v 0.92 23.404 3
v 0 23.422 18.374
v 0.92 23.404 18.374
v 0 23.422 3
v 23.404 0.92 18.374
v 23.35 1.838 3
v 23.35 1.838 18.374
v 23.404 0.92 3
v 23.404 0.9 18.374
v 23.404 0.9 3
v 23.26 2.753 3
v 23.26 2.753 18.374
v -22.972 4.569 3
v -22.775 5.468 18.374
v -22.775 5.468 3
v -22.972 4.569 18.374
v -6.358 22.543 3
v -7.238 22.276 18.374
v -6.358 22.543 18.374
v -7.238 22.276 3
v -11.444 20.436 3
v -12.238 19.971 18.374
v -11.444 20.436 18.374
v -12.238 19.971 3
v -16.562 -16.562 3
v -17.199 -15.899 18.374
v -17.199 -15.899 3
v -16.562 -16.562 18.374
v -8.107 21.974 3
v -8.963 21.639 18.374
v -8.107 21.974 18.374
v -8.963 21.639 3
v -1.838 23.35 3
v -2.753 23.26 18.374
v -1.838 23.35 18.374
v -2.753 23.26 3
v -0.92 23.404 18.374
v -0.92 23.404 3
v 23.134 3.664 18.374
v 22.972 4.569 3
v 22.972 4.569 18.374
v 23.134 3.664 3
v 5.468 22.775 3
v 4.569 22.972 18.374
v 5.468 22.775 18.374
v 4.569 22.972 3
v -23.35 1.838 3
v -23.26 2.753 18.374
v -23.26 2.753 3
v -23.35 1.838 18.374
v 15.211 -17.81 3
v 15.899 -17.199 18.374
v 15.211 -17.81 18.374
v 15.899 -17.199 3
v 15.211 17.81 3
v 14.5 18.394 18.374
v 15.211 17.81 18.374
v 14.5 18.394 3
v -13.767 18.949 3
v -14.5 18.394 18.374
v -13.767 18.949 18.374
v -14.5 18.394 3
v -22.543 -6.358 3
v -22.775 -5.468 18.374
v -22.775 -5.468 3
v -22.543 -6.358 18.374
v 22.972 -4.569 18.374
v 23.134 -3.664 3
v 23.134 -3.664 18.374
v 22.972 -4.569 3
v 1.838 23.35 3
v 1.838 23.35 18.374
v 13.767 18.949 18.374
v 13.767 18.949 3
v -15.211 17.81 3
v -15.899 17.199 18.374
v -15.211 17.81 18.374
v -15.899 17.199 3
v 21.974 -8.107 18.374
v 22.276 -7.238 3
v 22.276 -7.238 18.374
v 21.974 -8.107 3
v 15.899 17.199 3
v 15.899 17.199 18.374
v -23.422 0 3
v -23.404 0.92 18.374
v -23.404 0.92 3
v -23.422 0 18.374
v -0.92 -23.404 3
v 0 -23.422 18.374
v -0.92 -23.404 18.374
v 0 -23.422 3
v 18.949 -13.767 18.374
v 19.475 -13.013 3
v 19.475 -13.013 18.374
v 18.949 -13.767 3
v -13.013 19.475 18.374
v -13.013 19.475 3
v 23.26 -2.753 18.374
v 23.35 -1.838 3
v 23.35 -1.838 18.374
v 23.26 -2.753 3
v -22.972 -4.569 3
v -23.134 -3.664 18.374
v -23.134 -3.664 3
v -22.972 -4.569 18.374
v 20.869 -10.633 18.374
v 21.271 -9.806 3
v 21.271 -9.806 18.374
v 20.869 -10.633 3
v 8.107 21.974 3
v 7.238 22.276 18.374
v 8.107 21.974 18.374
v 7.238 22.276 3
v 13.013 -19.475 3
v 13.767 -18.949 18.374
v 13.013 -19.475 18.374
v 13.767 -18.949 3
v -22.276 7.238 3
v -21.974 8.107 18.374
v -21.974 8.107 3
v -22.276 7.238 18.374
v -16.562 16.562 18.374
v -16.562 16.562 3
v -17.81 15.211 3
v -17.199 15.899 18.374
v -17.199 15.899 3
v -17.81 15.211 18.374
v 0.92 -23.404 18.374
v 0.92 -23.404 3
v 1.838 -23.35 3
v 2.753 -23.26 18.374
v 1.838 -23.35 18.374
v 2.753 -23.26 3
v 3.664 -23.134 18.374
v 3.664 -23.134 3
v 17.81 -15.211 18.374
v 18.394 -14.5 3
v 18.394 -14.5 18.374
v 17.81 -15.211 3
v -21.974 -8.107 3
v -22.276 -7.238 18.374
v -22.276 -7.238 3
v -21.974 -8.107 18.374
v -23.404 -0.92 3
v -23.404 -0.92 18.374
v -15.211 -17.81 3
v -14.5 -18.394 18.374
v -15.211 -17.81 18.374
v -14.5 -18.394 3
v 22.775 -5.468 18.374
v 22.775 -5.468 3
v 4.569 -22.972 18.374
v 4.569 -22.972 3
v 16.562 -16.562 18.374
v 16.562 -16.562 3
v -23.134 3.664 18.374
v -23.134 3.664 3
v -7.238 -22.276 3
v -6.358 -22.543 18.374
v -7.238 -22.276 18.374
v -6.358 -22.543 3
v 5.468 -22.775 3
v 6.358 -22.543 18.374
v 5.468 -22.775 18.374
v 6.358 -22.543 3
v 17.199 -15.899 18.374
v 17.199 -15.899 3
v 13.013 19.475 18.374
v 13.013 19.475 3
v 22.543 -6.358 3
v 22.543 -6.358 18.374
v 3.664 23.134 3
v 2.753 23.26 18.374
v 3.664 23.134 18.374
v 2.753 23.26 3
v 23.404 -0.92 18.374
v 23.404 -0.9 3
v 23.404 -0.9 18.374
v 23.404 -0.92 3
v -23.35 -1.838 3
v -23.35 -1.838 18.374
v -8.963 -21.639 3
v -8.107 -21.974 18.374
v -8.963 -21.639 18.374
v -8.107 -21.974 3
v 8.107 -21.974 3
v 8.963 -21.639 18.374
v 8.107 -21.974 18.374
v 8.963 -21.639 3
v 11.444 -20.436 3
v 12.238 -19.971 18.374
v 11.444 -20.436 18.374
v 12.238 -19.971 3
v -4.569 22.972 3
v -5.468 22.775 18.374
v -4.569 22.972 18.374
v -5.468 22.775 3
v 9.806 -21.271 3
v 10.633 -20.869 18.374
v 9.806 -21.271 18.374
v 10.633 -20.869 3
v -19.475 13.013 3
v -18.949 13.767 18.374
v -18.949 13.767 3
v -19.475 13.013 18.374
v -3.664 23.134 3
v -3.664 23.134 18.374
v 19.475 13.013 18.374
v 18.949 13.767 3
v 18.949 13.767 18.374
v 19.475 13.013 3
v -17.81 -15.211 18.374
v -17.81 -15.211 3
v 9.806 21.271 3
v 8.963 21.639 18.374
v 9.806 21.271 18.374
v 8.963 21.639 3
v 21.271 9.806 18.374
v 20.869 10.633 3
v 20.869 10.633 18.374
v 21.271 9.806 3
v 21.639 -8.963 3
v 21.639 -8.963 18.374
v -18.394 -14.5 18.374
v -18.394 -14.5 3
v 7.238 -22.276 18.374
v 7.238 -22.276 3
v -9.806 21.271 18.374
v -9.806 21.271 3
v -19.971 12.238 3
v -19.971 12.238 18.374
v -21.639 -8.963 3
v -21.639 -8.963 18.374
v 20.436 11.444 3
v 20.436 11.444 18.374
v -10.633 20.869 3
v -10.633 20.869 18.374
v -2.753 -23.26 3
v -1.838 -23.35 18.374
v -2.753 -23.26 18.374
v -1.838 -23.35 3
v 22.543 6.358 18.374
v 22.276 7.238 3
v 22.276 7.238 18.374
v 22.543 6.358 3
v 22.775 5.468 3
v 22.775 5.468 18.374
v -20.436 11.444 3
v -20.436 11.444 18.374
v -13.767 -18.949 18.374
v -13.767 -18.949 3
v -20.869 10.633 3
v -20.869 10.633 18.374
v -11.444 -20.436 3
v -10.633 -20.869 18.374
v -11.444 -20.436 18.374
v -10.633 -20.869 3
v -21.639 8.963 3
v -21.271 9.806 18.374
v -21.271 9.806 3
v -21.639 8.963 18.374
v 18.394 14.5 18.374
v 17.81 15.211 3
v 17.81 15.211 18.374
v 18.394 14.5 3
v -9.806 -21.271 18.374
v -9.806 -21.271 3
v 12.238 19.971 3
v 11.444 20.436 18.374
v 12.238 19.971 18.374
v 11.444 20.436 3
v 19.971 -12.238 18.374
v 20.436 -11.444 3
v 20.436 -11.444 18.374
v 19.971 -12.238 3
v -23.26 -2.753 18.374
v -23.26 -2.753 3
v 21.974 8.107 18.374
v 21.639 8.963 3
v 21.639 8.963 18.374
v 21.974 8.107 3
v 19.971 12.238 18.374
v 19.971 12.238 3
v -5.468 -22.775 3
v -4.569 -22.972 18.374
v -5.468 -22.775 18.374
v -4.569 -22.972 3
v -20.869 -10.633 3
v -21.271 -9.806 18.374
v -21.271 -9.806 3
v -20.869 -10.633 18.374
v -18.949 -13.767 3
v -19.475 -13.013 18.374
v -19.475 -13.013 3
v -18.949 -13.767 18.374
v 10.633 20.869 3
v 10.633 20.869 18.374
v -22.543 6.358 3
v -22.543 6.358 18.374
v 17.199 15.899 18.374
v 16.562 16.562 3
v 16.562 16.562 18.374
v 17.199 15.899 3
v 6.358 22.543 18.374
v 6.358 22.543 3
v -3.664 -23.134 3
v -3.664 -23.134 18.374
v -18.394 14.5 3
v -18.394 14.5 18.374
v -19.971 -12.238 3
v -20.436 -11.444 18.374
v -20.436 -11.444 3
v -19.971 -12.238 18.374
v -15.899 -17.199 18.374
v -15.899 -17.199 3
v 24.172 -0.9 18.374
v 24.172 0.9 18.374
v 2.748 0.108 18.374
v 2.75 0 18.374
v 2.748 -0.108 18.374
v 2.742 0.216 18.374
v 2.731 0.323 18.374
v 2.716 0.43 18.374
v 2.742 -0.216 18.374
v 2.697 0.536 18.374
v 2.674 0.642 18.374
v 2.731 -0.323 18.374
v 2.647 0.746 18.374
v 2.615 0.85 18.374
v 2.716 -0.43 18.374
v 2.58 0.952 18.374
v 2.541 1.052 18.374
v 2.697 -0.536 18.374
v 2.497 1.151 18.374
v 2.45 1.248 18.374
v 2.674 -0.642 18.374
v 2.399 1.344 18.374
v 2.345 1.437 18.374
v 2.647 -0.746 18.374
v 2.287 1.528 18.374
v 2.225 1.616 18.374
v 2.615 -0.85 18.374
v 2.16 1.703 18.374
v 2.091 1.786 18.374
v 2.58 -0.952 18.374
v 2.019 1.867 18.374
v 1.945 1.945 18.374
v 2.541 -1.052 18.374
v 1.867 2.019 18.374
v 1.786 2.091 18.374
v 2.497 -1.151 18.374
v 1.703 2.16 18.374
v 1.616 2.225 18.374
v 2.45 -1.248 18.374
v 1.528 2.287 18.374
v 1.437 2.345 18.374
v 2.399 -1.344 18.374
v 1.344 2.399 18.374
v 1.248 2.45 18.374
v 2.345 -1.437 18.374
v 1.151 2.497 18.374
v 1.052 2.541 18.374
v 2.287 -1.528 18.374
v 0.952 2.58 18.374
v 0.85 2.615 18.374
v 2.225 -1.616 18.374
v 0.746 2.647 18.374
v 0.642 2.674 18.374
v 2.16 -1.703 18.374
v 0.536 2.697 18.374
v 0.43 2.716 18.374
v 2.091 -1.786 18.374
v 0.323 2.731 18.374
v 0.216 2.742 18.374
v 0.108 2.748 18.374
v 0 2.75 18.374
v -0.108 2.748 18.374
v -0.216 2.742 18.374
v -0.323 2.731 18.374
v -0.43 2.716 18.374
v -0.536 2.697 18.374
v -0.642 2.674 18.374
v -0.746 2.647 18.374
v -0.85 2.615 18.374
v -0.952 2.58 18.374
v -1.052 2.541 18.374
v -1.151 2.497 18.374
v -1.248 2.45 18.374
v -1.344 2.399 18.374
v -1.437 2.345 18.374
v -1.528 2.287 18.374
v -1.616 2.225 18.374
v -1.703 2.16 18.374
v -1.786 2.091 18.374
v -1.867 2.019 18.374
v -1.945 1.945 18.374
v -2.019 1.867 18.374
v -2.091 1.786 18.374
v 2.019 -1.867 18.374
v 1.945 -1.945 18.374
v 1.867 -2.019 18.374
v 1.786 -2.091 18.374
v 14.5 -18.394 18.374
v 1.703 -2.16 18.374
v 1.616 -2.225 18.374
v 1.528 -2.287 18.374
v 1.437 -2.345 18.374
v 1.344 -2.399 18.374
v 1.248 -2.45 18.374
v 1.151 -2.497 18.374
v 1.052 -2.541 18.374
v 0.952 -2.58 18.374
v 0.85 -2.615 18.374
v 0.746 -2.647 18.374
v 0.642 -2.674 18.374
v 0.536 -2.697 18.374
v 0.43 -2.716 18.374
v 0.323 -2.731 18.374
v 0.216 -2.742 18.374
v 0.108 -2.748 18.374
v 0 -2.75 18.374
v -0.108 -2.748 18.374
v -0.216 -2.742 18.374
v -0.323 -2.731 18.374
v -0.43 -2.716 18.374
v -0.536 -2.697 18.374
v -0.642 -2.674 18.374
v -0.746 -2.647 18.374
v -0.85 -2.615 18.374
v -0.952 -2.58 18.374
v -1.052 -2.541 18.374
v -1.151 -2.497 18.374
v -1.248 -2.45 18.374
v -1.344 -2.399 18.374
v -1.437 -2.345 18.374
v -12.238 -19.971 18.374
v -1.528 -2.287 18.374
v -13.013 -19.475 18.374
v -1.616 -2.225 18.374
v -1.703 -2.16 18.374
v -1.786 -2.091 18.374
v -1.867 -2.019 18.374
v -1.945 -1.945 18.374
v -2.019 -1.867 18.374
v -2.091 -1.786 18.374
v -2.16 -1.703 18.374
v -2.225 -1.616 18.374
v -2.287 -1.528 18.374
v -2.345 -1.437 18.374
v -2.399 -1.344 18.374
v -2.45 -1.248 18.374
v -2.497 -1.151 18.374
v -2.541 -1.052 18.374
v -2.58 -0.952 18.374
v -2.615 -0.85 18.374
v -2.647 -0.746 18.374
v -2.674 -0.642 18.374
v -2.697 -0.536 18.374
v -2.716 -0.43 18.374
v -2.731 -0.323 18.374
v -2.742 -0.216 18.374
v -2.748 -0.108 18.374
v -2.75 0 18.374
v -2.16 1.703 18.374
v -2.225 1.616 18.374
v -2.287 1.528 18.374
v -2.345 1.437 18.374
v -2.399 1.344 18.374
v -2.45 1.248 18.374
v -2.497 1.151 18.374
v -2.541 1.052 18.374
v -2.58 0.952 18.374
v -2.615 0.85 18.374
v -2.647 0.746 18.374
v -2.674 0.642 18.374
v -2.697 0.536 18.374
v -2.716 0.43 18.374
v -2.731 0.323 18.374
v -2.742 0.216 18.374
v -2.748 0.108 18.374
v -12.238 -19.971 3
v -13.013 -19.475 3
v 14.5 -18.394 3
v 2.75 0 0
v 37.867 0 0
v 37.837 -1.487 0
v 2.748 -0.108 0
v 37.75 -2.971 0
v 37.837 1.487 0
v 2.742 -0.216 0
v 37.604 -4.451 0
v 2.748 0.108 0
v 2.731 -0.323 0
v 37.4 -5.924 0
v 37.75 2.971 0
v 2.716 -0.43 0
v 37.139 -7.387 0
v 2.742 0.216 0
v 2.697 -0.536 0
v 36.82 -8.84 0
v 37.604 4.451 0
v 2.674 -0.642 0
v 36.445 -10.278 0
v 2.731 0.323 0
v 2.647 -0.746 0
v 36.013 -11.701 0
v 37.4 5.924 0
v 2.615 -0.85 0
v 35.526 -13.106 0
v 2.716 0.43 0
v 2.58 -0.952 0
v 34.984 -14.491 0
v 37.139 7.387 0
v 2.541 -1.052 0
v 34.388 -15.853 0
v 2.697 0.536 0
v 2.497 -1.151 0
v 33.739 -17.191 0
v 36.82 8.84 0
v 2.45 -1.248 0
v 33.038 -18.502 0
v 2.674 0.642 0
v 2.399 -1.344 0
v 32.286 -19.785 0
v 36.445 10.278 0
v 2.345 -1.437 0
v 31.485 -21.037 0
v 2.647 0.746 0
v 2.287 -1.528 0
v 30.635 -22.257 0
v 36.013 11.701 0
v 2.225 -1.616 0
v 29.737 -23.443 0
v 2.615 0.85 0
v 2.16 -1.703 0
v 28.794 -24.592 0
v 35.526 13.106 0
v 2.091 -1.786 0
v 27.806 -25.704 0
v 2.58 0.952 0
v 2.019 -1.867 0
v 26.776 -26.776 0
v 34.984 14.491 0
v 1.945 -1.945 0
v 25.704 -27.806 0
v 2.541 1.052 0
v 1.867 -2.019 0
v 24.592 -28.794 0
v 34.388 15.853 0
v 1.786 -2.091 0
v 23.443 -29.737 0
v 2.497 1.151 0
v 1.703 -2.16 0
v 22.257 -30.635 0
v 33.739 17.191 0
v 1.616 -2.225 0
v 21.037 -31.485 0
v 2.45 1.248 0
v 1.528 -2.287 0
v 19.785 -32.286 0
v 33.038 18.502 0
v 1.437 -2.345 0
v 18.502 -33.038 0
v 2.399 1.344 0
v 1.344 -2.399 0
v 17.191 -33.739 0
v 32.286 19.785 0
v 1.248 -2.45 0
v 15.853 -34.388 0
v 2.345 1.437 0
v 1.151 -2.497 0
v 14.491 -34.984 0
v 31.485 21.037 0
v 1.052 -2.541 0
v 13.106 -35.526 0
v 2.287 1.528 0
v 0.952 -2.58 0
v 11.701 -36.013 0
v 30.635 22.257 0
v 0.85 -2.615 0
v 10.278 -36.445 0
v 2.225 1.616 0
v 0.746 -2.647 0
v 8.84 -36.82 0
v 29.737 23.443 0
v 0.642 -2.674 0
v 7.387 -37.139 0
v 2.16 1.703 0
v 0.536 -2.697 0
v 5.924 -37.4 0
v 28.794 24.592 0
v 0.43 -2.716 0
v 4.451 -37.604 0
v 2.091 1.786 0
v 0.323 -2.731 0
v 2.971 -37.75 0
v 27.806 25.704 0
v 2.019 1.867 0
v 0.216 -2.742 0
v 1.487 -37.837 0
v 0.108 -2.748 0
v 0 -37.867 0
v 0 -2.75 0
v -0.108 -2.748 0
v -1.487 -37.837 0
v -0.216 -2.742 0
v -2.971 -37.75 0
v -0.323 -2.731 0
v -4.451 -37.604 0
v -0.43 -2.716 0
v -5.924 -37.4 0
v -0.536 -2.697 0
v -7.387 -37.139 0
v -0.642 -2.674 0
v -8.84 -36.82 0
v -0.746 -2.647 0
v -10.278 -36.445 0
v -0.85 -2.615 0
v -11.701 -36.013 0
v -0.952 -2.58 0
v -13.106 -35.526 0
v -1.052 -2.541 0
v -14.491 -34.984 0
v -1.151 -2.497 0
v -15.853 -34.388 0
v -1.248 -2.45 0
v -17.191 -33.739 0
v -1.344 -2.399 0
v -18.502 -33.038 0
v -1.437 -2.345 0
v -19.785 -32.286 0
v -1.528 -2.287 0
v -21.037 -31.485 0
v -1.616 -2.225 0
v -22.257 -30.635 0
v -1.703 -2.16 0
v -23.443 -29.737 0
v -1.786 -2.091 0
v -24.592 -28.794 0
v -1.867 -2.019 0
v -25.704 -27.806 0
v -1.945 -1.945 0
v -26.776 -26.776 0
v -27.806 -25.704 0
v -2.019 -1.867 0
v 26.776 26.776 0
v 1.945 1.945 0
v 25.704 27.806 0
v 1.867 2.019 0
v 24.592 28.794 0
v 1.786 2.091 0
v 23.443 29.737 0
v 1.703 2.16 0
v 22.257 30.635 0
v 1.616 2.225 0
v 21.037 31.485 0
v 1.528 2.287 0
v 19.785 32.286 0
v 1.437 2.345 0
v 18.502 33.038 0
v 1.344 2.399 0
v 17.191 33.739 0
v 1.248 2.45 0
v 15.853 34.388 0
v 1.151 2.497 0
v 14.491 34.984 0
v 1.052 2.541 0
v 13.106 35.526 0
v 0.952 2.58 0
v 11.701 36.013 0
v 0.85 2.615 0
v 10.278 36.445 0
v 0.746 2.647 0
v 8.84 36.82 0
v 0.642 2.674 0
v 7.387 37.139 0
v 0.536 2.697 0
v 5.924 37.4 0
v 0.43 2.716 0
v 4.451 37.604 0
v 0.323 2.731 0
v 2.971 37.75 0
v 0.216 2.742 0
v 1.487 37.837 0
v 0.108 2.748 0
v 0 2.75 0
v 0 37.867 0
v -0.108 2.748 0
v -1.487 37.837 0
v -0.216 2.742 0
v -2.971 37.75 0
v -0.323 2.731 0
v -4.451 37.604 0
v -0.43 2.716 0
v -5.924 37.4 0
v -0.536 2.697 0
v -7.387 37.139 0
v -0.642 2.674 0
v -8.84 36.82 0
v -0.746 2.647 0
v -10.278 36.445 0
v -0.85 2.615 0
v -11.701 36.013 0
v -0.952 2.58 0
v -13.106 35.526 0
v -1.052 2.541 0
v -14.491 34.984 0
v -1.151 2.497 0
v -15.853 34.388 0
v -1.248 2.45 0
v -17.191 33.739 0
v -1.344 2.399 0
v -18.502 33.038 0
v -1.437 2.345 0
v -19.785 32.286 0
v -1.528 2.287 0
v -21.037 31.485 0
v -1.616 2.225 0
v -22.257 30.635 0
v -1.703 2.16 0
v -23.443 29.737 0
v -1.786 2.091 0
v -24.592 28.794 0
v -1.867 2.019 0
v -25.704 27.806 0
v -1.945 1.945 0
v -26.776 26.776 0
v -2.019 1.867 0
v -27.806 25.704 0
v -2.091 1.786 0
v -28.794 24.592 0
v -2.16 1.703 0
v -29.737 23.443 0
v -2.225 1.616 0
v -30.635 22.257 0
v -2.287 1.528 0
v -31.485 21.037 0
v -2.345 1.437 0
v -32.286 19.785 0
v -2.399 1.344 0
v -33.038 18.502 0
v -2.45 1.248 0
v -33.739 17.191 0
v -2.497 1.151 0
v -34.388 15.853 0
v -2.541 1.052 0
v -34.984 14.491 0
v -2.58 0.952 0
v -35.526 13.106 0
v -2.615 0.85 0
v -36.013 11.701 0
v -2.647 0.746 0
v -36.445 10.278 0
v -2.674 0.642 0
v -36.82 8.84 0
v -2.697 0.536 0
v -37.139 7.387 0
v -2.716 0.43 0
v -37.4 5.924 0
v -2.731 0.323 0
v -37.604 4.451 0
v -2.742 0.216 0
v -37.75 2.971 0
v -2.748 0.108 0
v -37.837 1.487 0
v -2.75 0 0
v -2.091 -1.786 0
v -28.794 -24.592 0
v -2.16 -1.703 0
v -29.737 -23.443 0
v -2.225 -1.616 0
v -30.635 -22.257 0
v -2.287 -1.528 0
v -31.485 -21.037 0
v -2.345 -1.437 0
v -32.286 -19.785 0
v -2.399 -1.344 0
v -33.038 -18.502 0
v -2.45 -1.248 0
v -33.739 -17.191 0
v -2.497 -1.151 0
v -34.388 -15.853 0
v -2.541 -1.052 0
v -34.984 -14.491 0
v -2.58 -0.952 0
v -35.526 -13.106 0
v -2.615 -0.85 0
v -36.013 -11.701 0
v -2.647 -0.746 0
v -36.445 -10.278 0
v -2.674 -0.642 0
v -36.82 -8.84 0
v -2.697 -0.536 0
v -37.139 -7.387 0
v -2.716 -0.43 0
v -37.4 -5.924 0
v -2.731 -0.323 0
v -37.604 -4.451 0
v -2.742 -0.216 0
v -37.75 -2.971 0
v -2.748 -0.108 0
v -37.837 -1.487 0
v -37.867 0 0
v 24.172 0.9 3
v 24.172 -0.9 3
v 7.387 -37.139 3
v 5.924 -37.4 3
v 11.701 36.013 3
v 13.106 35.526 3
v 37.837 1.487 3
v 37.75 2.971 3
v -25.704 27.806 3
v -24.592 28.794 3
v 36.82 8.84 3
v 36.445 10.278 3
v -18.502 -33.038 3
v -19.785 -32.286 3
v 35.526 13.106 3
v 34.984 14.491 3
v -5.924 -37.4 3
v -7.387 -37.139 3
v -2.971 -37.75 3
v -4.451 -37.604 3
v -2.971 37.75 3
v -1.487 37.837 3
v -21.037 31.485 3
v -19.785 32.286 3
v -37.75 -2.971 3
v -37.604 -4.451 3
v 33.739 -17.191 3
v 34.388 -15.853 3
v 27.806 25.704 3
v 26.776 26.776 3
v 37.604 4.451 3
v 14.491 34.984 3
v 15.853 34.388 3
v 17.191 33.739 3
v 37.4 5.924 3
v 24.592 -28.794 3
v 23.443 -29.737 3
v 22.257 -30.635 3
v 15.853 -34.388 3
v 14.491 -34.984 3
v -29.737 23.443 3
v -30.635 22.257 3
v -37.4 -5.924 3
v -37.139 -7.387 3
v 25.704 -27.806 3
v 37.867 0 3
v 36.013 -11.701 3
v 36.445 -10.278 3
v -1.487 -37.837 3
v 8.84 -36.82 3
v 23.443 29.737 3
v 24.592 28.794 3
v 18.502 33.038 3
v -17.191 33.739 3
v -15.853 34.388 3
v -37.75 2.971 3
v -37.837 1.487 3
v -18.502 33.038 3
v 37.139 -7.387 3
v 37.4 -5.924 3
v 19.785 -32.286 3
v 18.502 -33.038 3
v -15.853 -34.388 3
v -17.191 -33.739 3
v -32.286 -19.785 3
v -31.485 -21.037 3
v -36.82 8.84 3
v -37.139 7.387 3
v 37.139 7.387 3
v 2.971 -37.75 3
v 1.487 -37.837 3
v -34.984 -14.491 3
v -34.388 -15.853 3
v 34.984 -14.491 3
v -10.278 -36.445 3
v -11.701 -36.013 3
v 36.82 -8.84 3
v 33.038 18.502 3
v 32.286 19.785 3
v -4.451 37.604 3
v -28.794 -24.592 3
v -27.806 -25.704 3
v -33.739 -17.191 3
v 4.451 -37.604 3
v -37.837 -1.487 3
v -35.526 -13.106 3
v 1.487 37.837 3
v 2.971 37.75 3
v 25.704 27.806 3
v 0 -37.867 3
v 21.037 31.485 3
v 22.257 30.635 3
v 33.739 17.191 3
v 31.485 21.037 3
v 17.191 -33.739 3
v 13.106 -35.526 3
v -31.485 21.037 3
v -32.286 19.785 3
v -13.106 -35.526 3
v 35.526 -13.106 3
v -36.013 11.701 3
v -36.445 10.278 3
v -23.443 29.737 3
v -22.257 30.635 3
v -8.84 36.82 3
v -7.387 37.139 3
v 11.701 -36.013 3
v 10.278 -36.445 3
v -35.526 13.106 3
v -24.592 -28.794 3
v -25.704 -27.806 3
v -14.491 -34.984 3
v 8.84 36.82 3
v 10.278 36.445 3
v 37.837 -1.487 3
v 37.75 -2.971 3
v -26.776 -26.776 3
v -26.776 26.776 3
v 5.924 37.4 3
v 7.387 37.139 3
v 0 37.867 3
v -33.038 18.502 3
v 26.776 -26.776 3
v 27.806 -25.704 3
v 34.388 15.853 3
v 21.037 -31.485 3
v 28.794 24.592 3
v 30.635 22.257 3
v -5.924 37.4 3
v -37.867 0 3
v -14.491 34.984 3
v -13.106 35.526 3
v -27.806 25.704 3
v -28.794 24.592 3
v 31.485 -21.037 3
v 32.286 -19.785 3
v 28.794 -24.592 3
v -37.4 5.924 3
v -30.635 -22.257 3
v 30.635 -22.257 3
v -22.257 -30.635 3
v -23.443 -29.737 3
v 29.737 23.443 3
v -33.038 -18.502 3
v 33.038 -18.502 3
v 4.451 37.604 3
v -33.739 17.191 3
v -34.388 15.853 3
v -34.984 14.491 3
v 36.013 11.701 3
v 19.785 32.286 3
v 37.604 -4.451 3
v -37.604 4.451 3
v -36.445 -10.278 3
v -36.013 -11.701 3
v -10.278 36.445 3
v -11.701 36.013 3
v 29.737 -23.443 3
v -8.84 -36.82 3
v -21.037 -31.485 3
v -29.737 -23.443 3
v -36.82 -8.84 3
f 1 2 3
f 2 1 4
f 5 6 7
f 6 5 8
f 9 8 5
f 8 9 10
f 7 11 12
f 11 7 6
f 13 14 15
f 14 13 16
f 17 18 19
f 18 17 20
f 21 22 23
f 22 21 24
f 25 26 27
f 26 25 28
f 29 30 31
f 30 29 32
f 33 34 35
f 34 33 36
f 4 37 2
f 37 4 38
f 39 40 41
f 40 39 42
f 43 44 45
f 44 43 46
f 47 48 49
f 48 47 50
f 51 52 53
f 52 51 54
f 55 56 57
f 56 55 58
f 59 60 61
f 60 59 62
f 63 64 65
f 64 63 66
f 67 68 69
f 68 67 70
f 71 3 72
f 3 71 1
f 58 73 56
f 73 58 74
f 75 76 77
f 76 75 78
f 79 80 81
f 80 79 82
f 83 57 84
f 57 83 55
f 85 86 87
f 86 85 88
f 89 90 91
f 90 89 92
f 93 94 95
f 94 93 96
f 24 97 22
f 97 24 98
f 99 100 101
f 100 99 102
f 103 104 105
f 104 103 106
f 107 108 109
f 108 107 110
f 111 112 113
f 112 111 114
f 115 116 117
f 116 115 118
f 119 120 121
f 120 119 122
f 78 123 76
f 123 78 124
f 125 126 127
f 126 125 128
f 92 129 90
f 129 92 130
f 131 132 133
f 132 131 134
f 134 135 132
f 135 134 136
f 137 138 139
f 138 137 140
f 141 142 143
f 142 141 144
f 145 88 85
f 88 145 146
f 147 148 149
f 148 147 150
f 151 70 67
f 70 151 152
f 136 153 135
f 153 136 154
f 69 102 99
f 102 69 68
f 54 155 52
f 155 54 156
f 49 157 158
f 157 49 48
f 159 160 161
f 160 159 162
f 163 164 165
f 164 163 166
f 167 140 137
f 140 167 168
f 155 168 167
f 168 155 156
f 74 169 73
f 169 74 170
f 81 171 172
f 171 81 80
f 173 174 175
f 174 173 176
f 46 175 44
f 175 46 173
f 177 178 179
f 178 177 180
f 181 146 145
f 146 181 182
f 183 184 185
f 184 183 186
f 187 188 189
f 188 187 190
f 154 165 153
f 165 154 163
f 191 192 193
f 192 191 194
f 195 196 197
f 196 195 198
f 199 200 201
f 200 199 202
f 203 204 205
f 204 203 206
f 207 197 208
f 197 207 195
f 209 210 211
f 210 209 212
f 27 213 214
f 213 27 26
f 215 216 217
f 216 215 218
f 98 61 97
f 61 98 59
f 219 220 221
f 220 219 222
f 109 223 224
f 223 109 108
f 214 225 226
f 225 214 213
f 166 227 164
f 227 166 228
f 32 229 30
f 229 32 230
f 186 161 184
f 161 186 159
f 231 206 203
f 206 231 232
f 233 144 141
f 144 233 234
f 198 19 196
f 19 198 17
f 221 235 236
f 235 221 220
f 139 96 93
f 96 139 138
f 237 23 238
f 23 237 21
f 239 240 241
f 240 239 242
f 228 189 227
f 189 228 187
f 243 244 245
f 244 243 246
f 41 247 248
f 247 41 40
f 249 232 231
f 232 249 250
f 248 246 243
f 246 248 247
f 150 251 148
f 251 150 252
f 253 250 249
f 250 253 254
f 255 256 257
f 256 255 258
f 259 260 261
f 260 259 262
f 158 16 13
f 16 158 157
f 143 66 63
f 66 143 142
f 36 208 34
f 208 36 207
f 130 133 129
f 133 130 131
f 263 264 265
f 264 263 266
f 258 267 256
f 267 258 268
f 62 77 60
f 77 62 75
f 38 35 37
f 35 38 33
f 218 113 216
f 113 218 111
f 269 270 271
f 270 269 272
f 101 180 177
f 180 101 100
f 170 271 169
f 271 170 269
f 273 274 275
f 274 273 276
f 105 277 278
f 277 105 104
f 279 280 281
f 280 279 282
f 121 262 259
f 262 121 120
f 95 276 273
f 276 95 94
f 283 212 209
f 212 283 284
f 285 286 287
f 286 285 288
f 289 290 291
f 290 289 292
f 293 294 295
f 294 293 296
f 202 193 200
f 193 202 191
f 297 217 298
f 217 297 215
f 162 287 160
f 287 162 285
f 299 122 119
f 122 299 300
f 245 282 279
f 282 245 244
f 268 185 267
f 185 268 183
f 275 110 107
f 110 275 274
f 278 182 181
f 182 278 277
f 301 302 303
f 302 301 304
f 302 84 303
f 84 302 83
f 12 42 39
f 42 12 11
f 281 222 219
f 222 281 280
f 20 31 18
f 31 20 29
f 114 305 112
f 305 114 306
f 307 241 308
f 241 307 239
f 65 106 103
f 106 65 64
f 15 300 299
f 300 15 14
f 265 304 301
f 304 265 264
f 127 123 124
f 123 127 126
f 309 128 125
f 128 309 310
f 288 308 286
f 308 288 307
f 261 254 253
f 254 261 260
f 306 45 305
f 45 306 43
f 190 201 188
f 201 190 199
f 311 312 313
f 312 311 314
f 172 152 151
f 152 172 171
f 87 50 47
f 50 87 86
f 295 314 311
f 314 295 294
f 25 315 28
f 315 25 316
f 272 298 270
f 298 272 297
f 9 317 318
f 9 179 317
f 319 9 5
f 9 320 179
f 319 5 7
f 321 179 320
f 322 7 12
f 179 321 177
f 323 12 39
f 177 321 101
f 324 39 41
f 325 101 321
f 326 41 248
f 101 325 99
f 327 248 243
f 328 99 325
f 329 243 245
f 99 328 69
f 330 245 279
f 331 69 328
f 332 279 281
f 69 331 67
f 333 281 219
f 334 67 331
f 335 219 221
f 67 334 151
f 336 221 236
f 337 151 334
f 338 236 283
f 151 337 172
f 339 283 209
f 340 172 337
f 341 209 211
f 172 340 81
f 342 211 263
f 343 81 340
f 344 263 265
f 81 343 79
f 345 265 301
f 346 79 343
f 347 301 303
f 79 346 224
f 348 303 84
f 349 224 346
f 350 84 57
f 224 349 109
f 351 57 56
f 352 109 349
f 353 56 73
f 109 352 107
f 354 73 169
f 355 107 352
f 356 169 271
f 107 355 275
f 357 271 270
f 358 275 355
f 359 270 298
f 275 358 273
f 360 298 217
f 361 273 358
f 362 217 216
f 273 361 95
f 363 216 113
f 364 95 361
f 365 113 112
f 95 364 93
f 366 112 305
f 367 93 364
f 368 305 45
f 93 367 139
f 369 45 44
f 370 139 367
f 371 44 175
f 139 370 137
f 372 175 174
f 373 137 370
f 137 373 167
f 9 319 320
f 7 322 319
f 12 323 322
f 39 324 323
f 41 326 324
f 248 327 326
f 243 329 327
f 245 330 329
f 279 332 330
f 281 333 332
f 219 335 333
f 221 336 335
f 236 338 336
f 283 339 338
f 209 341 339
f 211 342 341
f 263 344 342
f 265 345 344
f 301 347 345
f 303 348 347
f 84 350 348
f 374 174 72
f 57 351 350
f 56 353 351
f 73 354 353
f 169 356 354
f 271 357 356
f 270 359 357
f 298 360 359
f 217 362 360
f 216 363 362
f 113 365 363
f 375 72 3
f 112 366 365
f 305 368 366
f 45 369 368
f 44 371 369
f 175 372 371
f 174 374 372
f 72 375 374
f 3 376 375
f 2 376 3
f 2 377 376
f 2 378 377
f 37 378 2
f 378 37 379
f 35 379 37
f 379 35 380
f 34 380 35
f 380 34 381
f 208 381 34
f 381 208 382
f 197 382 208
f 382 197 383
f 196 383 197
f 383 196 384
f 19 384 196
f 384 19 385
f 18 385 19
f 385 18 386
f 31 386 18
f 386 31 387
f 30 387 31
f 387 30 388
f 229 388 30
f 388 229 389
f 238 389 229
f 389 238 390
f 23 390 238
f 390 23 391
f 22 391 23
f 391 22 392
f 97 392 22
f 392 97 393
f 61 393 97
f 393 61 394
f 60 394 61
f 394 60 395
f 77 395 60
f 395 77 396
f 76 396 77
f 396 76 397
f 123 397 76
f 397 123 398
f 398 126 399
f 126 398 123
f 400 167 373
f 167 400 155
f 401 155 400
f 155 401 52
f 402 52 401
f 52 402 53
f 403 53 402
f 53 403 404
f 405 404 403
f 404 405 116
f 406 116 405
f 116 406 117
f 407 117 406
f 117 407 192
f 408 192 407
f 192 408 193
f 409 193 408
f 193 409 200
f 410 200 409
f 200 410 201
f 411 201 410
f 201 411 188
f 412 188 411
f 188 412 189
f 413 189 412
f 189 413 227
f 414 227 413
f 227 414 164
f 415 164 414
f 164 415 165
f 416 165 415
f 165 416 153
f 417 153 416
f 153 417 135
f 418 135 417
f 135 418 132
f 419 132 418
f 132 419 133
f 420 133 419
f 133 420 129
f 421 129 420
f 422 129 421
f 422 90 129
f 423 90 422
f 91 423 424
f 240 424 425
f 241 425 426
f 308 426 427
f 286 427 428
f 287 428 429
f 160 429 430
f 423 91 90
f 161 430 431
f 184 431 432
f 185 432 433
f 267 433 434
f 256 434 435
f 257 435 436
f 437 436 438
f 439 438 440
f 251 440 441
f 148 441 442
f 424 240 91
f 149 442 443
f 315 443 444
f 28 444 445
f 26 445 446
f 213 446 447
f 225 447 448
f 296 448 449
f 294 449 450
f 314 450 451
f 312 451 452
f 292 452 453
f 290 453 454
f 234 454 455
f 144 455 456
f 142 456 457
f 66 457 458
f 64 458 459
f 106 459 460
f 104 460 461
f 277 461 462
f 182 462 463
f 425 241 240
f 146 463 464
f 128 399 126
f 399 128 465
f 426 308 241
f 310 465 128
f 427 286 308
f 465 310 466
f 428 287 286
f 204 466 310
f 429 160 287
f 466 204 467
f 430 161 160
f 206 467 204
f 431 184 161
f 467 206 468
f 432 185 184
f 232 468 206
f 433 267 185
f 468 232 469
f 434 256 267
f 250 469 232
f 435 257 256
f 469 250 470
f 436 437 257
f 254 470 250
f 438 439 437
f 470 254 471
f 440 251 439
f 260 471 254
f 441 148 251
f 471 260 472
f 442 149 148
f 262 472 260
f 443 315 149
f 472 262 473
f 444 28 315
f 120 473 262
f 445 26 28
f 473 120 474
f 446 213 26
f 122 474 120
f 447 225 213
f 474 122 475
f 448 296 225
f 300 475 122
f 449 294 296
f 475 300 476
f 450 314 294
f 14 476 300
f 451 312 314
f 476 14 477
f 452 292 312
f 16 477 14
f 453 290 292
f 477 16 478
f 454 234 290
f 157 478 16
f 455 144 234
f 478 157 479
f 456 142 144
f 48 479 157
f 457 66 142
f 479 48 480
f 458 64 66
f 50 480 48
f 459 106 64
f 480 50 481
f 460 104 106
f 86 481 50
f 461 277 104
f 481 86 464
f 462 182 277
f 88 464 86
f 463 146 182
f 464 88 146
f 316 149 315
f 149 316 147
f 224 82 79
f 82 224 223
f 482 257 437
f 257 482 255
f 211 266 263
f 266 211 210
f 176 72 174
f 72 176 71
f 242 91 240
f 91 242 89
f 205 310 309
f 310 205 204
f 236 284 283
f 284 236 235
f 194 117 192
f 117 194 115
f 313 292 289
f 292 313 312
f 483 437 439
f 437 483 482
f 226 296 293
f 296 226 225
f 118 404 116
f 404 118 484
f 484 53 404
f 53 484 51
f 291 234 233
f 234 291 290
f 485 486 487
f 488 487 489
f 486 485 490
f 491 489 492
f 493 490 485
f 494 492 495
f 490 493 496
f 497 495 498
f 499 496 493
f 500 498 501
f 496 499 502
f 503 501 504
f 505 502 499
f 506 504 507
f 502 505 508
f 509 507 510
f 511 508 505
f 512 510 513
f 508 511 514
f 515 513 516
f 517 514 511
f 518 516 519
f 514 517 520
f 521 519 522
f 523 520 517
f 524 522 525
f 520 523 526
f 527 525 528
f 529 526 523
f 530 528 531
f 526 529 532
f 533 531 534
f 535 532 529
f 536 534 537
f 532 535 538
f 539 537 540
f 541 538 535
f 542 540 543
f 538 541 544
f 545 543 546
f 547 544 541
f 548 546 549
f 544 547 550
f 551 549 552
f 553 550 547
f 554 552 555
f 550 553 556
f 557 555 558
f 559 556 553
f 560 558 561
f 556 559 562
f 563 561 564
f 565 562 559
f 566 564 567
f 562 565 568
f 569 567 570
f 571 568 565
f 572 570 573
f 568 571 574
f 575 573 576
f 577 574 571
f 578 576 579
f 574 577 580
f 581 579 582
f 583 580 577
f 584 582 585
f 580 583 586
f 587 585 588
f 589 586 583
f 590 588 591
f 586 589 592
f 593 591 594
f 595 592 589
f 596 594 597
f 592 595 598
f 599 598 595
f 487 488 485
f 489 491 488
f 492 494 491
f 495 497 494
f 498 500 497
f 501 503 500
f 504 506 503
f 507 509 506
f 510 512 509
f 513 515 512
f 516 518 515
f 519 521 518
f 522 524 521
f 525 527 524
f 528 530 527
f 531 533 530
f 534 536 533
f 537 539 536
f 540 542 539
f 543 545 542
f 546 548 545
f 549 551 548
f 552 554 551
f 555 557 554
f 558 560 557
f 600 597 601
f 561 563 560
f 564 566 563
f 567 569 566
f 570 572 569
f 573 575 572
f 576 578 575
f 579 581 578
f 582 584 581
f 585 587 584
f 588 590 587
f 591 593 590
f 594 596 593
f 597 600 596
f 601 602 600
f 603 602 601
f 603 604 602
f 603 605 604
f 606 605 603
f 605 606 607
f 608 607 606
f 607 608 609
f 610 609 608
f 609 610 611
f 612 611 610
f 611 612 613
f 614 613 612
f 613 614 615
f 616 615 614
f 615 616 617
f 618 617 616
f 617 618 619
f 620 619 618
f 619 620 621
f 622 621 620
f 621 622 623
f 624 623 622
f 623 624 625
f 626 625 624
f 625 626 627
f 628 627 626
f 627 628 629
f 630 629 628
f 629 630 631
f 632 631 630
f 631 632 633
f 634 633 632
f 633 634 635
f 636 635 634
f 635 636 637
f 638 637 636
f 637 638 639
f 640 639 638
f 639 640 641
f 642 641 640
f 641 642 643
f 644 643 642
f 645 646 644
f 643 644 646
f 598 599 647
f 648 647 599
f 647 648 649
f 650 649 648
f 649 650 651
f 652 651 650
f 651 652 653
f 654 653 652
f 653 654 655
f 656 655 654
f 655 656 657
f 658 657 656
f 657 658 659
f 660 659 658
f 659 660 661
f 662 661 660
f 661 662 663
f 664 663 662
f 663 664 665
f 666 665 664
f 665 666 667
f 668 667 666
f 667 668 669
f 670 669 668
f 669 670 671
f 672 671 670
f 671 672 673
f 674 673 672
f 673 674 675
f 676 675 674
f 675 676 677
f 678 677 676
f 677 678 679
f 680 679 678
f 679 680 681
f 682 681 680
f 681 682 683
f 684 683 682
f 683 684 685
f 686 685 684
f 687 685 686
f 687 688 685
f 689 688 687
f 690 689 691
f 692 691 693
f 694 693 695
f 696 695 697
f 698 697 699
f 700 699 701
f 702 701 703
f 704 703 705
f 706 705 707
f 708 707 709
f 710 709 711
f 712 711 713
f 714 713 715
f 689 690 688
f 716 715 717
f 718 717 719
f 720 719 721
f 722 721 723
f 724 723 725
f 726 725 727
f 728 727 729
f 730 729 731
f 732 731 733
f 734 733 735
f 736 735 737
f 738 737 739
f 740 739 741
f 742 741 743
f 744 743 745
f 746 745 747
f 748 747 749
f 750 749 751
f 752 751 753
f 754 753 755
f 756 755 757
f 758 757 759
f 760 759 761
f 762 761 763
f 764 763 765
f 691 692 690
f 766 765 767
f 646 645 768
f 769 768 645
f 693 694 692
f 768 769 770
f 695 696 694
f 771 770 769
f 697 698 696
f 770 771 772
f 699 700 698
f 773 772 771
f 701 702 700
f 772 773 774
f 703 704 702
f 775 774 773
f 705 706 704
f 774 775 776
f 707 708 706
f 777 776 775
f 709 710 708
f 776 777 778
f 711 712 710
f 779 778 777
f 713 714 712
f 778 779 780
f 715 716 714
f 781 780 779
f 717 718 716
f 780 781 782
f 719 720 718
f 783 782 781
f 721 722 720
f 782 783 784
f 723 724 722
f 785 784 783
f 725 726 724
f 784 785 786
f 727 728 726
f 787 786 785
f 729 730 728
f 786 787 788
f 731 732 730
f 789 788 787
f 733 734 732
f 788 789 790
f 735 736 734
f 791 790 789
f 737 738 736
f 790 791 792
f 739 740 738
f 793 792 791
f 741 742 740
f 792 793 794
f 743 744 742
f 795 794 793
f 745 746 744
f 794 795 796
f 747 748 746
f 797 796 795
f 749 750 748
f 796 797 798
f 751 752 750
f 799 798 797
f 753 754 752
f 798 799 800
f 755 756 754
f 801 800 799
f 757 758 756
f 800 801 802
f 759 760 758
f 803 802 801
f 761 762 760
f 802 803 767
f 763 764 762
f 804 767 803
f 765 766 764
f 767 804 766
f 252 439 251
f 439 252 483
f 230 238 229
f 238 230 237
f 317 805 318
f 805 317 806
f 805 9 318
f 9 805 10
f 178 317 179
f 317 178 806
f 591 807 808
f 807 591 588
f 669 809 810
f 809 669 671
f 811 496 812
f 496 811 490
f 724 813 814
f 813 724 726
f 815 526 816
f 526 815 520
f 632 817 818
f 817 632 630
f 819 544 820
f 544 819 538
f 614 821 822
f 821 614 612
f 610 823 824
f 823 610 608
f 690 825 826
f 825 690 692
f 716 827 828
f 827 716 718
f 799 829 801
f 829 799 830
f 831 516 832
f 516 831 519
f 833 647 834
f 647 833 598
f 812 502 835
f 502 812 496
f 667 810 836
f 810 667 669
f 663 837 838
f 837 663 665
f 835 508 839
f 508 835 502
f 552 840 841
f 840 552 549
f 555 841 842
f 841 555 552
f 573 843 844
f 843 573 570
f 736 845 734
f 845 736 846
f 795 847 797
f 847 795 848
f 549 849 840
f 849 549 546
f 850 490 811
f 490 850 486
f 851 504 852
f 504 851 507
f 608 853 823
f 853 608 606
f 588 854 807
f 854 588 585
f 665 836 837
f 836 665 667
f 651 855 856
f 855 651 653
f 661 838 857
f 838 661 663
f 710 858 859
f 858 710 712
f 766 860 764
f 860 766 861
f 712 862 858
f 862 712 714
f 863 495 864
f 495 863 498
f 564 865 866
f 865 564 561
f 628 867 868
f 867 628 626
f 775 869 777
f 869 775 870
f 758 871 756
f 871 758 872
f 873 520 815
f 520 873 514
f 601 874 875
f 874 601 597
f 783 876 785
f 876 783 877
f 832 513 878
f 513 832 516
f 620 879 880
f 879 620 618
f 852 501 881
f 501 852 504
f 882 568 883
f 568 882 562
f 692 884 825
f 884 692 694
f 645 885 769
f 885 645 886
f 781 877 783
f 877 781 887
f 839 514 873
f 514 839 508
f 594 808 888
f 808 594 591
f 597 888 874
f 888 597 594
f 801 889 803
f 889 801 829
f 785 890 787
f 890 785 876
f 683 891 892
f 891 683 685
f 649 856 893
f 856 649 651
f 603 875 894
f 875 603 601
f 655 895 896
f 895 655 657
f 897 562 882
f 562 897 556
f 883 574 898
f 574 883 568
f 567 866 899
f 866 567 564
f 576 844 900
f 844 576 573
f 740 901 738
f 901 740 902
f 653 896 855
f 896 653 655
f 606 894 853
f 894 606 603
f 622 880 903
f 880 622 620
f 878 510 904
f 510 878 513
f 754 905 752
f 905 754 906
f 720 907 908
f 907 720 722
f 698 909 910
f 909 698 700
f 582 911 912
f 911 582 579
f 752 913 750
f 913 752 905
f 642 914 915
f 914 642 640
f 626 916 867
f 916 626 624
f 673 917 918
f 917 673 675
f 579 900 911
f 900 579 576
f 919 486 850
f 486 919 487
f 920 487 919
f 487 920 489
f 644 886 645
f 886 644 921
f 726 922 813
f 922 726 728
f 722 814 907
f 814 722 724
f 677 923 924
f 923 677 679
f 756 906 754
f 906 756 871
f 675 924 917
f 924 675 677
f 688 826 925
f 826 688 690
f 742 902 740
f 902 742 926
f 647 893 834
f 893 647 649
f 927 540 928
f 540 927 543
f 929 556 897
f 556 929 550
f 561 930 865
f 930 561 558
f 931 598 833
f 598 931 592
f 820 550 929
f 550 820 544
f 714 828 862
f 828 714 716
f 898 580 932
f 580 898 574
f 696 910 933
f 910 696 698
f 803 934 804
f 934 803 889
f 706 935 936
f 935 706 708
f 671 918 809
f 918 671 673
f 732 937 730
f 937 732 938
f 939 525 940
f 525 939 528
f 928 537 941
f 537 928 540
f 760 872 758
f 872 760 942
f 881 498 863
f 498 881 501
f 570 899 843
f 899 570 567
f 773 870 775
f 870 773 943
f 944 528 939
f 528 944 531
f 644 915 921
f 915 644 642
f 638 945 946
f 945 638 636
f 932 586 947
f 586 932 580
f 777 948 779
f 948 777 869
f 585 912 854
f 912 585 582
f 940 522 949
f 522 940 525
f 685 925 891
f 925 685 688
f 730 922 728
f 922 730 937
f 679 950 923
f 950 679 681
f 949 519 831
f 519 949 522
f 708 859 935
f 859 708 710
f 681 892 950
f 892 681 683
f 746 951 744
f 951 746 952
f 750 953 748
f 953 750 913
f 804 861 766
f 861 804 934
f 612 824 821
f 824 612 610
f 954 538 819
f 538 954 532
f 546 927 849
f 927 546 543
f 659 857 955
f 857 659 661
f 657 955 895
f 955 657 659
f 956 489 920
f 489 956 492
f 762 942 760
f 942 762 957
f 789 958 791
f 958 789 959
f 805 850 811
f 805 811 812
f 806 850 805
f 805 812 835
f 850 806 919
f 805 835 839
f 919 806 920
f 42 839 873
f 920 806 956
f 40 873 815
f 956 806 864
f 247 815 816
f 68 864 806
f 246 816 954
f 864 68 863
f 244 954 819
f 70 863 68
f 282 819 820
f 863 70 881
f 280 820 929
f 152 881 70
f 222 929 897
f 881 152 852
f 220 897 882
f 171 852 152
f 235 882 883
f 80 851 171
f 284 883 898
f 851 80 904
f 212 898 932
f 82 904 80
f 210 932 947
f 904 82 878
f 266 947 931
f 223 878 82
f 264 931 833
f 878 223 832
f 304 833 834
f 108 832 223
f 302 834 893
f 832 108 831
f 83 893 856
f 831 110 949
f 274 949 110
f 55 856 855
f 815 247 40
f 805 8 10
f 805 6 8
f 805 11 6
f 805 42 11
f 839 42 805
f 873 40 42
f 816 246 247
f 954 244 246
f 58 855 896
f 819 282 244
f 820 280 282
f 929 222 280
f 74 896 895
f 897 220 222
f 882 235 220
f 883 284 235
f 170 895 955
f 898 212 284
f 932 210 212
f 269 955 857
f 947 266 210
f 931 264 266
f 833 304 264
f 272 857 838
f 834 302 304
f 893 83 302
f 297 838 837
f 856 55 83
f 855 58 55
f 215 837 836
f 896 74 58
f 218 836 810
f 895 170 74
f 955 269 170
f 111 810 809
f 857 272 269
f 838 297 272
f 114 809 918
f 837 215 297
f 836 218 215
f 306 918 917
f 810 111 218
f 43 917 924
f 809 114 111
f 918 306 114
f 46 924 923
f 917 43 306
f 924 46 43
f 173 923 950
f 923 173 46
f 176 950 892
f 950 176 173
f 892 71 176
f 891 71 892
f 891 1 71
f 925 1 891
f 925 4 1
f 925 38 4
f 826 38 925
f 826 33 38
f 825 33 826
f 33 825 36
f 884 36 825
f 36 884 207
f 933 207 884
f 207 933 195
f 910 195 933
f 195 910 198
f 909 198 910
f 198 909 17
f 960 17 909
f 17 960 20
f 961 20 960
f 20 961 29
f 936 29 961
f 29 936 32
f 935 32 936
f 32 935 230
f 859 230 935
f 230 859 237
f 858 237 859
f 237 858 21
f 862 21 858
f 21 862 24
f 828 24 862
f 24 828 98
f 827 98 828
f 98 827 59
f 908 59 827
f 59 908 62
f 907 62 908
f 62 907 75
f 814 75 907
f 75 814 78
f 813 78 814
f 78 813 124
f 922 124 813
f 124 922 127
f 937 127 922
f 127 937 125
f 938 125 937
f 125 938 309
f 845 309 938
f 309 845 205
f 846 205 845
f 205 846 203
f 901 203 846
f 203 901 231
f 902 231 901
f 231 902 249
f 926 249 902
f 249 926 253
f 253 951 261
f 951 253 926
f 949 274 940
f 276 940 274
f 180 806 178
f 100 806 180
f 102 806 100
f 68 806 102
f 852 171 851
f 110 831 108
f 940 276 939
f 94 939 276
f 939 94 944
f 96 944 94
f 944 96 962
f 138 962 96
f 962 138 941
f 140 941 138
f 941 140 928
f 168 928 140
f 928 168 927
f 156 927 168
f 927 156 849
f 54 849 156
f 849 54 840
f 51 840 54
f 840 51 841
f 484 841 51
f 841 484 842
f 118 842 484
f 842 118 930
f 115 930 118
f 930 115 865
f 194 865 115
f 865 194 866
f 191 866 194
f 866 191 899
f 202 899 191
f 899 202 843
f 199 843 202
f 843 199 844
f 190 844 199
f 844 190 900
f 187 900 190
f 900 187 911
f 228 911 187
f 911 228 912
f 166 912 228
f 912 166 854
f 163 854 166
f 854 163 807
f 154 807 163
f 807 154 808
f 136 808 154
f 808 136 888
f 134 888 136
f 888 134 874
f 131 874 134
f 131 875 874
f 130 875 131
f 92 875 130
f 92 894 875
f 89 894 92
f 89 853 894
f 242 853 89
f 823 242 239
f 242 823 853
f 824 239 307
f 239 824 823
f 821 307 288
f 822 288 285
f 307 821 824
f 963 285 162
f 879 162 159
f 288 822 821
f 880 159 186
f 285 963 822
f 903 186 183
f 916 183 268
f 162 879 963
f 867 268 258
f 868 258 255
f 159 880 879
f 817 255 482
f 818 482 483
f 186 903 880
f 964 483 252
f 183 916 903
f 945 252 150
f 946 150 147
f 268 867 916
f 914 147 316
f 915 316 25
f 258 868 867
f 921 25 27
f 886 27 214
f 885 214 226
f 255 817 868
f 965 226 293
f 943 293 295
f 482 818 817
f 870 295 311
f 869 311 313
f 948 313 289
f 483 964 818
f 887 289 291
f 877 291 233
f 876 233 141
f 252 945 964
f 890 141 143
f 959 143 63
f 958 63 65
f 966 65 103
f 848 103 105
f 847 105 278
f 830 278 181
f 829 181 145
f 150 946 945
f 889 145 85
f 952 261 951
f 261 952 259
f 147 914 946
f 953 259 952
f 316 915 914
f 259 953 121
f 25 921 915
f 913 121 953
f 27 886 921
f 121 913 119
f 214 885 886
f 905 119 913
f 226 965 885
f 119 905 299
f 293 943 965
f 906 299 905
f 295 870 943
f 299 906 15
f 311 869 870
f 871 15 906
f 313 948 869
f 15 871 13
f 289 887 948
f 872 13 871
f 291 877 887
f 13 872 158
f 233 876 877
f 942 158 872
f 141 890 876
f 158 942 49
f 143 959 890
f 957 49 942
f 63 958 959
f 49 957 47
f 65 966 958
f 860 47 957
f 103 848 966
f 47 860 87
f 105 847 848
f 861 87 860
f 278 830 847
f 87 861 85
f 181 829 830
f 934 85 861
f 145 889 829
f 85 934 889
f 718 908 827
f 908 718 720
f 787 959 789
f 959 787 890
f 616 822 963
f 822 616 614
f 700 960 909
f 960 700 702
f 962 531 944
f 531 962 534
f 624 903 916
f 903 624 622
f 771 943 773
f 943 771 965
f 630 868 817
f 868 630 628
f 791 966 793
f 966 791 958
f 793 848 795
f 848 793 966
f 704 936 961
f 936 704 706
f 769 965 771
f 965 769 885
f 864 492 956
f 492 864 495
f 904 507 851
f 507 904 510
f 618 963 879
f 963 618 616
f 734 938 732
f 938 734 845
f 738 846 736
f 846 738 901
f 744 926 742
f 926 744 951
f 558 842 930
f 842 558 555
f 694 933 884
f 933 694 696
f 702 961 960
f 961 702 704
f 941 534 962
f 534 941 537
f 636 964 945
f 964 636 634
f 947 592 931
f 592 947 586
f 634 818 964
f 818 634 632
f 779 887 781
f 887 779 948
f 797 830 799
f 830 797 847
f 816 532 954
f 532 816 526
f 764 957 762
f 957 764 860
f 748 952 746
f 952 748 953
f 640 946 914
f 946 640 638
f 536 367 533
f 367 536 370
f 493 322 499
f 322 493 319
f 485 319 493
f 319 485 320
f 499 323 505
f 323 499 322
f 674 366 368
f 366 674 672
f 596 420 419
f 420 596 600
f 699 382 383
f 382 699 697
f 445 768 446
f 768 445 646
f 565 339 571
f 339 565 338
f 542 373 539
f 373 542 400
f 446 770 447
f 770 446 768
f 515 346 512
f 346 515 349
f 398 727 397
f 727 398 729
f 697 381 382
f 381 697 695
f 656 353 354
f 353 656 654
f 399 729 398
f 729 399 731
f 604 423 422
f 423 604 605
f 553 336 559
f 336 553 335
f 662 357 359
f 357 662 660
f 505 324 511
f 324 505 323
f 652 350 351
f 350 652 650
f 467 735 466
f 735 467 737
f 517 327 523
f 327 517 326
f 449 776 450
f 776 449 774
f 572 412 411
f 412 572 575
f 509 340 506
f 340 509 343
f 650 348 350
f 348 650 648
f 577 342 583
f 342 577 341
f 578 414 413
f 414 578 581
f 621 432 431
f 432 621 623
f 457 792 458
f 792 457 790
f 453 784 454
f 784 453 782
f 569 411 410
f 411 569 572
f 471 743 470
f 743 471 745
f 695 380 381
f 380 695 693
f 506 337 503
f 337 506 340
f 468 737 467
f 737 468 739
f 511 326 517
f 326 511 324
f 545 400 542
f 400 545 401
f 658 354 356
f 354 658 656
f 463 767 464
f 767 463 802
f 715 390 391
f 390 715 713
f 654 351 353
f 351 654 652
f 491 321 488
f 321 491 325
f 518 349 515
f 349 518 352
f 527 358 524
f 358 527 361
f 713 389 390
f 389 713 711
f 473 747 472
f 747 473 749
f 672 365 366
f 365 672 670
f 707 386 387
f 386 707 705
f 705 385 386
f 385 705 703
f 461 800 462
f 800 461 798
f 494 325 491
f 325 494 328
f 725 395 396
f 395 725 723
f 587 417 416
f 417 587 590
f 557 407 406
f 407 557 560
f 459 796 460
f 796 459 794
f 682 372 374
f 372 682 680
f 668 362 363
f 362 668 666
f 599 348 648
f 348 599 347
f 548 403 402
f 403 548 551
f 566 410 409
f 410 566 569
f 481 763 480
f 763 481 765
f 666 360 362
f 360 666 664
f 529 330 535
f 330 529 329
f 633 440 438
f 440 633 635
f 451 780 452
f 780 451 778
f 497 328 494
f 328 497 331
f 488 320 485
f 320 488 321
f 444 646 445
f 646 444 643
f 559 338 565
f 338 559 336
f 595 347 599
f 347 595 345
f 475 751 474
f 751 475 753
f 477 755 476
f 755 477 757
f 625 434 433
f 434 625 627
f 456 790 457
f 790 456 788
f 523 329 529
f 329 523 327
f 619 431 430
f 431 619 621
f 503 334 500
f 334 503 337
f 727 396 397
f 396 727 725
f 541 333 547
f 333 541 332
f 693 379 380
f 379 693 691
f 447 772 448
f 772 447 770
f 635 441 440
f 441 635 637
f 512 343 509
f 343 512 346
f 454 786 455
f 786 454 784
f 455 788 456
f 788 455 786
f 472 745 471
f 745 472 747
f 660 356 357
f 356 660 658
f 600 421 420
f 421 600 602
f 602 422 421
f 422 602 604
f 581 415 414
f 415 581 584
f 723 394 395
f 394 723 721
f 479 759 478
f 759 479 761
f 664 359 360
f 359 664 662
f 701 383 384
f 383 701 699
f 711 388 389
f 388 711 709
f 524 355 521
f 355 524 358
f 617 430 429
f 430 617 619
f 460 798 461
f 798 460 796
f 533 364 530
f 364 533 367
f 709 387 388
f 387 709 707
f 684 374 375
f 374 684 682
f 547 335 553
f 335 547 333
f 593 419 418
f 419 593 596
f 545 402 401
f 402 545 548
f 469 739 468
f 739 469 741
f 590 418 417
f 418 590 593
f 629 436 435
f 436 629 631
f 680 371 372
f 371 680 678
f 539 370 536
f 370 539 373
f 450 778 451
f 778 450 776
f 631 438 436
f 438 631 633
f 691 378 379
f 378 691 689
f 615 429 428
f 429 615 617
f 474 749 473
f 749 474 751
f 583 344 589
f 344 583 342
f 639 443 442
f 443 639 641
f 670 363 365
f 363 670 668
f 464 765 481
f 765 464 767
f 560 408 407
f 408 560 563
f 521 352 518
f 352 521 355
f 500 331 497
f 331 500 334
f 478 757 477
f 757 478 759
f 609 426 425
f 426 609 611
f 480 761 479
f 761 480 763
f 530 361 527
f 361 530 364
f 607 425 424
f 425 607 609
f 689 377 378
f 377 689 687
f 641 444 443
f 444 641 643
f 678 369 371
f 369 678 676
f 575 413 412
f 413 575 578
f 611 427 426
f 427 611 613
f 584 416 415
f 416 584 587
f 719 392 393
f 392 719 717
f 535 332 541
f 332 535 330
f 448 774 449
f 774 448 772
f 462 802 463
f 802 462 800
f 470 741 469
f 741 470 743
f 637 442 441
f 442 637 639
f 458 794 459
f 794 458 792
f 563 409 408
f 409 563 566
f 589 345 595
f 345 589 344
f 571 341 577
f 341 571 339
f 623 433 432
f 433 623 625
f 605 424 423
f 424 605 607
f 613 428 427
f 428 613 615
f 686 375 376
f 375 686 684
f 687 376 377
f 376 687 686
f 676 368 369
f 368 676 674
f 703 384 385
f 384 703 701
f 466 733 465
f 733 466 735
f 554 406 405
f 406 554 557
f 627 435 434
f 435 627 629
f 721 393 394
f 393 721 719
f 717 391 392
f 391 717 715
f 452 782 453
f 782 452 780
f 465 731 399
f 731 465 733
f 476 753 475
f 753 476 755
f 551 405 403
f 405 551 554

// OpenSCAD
// file: motor_lib.scad
// Biblioteca del motor DronSwarm (M6). Las medidas vienen de <dron>_motor_params.scad (generado). Unidades: mm.
// Sin hull/minkowski (CLAUDE.md): todo con cilindros, polígonos y extrusiones.
$fn = 160;

// ---------- láser ----------
module stator_lamination_2d() {           // lámina del estator: 0.2 mm de acero al silicio (NO20)
    difference() {
        circle(r = r_s);
        circle(r = r_bore);
        for (s = slots) polygon(s);
        translate([r_bore - 0.01, -1.0]) square([1.2, 2.0]);                 // chaveta: alinea las láminas y fija al tubo
    }
}
module rotor_ring_2d() {                  // anillo del rotor: acero común 1 mm, se apilan n_ring
    difference() {
        circle(r = r_out);
        circle(r = r_mag_out + fit_slide / 2);
        translate([r_mag_out, -0.75]) square([0.8, 1.5]);                     // marca de orientación (polo 1)
    }
}

// ---------- impresas ----------
module cap() {                            // tapa: lleva la hélice y el eje; el anillo del rotor entra 2 mm en la ranura
    hub_r = shaft / 2 + 3.5;
    difference() {
        union() {
            cylinder(r = r_out + 1.2, h = cap_t);
            translate([0, 0, -2]) difference() {                                 // pollera que abraza el anillo
                cylinder(r = r_out + 1.2, h = 2);
                translate([0, 0, -0.1]) cylinder(r = r_out + print_clear / 2, h = 2.2);
            }
            cylinder(r = hub_r, h = cap_t + 4);                                  // cubo del eje
        }
        translate([0, 0, -1]) cylinder(d = shaft + fit_press, h = cap_t + 6);   // eje a presión
        translate([0, 0, cap_t + 2]) rotate([0, 90, 0]) cylinder(d = 2.6, h = hub_r + 1);   // prisionero M3
        for (i = [0 : prop_n - 1]) rotate(360 / prop_n * i + 45)
            translate([prop_pcd / 2, 0, -1]) cylinder(d = prop_bolt, h = cap_t + 6);
        for (i = [0 : prop_n - 1]) rotate(360 / prop_n * i)                      // ventilación entre los tornillos de la hélice
            translate([0, 0, -1]) linear_extrude(cap_t + 2)
                polygon([[ (hub_r + 2) * cos(-14), (hub_r + 2) * sin(-14)], [ (r_mag_in - 3) * cos(-18), (r_mag_in - 3) * sin(-18)],
                         [ (r_mag_in - 3) * cos(18), (r_mag_in - 3) * sin(18)], [ (hub_r + 2) * cos(14), (hub_r + 2) * sin(14)]]);
    }
}

module base() {                           // base: tubo con los 2 rodamientos, sostiene el estator, se atornilla al DMI
    tube_h = l_stack + 2 * overhang + 1;
    difference() {
        union() {
            cylinder(r = max(r_bore + 5, dmi_pcd / 2 + 4), h = base_t);
            cylinder(r = r_bore + fit_press / 2, h = base_t + tube_h);               // el estator se pega sobre el tubo
            translate([r_bore - 0.2, -0.9, base_t]) cube([1.0, 1.8, tube_h]);        // chaveta (entra en la muesca de las láminas)
        }
        translate([0, 0, -1]) cylinder(d = bearing_od + fit_press, h = bearing_w + 1);                  // rodamiento inferior
        translate([0, 0, base_t + tube_h - bearing_w]) cylinder(d = bearing_od + fit_press, h = bearing_w + 1); // superior
        translate([0, 0, -1]) cylinder(d = shaft + 1.0, h = base_t + tube_h + 2);
        for (i = [0 : dmi_n - 1]) rotate(360 / dmi_n * i + 45) translate([dmi_pcd / 2, 0, -1]) cylinder(d = dmi_bolt, h = base_t + 2);
        translate([r_bore - 4, -2, -1]) cube([6, 4, base_t + 2]);                 // salida de los 3 cables de fase
    }
}

module magnet_jig() {                     // peine: se mete dentro del anillo y deja cada imán en su lugar (paso de polo exacto)
    rib = 2 * PI * r_mag_in / poles - magnet_w;      // espacio entre imanes en el diámetro interior
    difference() {
        union() {
            cylinder(r = r_mag_in - 0.15, h = l_stack + 4);
            for (i = [0 : poles - 1]) rotate(360 / poles * (i + 0.5))
                translate([r_mag_in - 0.5, -max(rib, 0.6) / 2, 0]) cube([h_magnet + 0.3, max(rib, 0.6) - 0.15, l_stack + 4]);
        }
        translate([0, 0, -1]) cylinder(r = r_mag_in - 3, h = l_stack + 6);
    }
}

module stack_mandrel() {                  // mandril de apilado: alinea las láminas por el agujero y la chaveta mientras cura el adhesivo
    difference() {
        union() {
            cylinder(r = r_bore - 0.05, h = l_stack + 10);
            translate([r_bore - 0.3, -0.9, 0]) cube([1.0, 1.8, l_stack + 10]);
            cylinder(r = r_s + 3, h = 3);
        }
        translate([0, 0, -1]) cylinder(d = 5.5, h = l_stack + 12);                // varilla roscada M5 para prensar
    }
}

module winding_holder() {                 // soporte para bobinar a mano: sujeta el estator por el agujero, con mango
    union() {
        cylinder(r = r_bore - 0.1, h = l_stack + 2);
        translate([r_bore - 0.4, -0.85, 0]) cube([1.0, 1.7, l_stack + 2]);
        translate([0, 0, -40]) cylinder(r = 7, h = 40);
    }
}

// ---------- ensamble (para ver) ----------
module assembly() {
    color("#b0b0b0") translate([0, 0, base_t + overhang]) linear_extrude(l_stack) stator_lamination_2d();
    color("#b87333") for (s = slots) translate([0, 0, base_t + 0.5]) linear_extrude(l_stack + 2 * overhang - 1) offset(r = -0.35) polygon(s);
    color("#4a4a4a") translate([0, 0, base_t + overhang - 1]) linear_extrude(l_stack + 2) rotor_ring_2d();
    color("#2a78d6") for (i = [0 : poles - 1]) rotate(360 / poles * i)
        translate([0, 0, base_t + overhang]) rotate_extrude(angle = 360 / poles * pole_arc)
            translate([r_mag_in, 0]) square([h_magnet, l_stack]);
    color("#eb6834") translate([0, 0, base_t + 2 * overhang + l_stack + 1]) cap();
    color("#eb6834", 0.9) base();
    color("#dddddd") translate([0, 0, -6]) cylinder(d = shaft, h = base_t + 2 * overhang + l_stack + cap_t + 14);
}
// main file
// DS-D · mandril_apilado (M6). Generado por motor/fabricacion/gen_cad.py
include <ds_d_motor_params.scad>
include <motor_lib.scad>
stack_mandrel();
